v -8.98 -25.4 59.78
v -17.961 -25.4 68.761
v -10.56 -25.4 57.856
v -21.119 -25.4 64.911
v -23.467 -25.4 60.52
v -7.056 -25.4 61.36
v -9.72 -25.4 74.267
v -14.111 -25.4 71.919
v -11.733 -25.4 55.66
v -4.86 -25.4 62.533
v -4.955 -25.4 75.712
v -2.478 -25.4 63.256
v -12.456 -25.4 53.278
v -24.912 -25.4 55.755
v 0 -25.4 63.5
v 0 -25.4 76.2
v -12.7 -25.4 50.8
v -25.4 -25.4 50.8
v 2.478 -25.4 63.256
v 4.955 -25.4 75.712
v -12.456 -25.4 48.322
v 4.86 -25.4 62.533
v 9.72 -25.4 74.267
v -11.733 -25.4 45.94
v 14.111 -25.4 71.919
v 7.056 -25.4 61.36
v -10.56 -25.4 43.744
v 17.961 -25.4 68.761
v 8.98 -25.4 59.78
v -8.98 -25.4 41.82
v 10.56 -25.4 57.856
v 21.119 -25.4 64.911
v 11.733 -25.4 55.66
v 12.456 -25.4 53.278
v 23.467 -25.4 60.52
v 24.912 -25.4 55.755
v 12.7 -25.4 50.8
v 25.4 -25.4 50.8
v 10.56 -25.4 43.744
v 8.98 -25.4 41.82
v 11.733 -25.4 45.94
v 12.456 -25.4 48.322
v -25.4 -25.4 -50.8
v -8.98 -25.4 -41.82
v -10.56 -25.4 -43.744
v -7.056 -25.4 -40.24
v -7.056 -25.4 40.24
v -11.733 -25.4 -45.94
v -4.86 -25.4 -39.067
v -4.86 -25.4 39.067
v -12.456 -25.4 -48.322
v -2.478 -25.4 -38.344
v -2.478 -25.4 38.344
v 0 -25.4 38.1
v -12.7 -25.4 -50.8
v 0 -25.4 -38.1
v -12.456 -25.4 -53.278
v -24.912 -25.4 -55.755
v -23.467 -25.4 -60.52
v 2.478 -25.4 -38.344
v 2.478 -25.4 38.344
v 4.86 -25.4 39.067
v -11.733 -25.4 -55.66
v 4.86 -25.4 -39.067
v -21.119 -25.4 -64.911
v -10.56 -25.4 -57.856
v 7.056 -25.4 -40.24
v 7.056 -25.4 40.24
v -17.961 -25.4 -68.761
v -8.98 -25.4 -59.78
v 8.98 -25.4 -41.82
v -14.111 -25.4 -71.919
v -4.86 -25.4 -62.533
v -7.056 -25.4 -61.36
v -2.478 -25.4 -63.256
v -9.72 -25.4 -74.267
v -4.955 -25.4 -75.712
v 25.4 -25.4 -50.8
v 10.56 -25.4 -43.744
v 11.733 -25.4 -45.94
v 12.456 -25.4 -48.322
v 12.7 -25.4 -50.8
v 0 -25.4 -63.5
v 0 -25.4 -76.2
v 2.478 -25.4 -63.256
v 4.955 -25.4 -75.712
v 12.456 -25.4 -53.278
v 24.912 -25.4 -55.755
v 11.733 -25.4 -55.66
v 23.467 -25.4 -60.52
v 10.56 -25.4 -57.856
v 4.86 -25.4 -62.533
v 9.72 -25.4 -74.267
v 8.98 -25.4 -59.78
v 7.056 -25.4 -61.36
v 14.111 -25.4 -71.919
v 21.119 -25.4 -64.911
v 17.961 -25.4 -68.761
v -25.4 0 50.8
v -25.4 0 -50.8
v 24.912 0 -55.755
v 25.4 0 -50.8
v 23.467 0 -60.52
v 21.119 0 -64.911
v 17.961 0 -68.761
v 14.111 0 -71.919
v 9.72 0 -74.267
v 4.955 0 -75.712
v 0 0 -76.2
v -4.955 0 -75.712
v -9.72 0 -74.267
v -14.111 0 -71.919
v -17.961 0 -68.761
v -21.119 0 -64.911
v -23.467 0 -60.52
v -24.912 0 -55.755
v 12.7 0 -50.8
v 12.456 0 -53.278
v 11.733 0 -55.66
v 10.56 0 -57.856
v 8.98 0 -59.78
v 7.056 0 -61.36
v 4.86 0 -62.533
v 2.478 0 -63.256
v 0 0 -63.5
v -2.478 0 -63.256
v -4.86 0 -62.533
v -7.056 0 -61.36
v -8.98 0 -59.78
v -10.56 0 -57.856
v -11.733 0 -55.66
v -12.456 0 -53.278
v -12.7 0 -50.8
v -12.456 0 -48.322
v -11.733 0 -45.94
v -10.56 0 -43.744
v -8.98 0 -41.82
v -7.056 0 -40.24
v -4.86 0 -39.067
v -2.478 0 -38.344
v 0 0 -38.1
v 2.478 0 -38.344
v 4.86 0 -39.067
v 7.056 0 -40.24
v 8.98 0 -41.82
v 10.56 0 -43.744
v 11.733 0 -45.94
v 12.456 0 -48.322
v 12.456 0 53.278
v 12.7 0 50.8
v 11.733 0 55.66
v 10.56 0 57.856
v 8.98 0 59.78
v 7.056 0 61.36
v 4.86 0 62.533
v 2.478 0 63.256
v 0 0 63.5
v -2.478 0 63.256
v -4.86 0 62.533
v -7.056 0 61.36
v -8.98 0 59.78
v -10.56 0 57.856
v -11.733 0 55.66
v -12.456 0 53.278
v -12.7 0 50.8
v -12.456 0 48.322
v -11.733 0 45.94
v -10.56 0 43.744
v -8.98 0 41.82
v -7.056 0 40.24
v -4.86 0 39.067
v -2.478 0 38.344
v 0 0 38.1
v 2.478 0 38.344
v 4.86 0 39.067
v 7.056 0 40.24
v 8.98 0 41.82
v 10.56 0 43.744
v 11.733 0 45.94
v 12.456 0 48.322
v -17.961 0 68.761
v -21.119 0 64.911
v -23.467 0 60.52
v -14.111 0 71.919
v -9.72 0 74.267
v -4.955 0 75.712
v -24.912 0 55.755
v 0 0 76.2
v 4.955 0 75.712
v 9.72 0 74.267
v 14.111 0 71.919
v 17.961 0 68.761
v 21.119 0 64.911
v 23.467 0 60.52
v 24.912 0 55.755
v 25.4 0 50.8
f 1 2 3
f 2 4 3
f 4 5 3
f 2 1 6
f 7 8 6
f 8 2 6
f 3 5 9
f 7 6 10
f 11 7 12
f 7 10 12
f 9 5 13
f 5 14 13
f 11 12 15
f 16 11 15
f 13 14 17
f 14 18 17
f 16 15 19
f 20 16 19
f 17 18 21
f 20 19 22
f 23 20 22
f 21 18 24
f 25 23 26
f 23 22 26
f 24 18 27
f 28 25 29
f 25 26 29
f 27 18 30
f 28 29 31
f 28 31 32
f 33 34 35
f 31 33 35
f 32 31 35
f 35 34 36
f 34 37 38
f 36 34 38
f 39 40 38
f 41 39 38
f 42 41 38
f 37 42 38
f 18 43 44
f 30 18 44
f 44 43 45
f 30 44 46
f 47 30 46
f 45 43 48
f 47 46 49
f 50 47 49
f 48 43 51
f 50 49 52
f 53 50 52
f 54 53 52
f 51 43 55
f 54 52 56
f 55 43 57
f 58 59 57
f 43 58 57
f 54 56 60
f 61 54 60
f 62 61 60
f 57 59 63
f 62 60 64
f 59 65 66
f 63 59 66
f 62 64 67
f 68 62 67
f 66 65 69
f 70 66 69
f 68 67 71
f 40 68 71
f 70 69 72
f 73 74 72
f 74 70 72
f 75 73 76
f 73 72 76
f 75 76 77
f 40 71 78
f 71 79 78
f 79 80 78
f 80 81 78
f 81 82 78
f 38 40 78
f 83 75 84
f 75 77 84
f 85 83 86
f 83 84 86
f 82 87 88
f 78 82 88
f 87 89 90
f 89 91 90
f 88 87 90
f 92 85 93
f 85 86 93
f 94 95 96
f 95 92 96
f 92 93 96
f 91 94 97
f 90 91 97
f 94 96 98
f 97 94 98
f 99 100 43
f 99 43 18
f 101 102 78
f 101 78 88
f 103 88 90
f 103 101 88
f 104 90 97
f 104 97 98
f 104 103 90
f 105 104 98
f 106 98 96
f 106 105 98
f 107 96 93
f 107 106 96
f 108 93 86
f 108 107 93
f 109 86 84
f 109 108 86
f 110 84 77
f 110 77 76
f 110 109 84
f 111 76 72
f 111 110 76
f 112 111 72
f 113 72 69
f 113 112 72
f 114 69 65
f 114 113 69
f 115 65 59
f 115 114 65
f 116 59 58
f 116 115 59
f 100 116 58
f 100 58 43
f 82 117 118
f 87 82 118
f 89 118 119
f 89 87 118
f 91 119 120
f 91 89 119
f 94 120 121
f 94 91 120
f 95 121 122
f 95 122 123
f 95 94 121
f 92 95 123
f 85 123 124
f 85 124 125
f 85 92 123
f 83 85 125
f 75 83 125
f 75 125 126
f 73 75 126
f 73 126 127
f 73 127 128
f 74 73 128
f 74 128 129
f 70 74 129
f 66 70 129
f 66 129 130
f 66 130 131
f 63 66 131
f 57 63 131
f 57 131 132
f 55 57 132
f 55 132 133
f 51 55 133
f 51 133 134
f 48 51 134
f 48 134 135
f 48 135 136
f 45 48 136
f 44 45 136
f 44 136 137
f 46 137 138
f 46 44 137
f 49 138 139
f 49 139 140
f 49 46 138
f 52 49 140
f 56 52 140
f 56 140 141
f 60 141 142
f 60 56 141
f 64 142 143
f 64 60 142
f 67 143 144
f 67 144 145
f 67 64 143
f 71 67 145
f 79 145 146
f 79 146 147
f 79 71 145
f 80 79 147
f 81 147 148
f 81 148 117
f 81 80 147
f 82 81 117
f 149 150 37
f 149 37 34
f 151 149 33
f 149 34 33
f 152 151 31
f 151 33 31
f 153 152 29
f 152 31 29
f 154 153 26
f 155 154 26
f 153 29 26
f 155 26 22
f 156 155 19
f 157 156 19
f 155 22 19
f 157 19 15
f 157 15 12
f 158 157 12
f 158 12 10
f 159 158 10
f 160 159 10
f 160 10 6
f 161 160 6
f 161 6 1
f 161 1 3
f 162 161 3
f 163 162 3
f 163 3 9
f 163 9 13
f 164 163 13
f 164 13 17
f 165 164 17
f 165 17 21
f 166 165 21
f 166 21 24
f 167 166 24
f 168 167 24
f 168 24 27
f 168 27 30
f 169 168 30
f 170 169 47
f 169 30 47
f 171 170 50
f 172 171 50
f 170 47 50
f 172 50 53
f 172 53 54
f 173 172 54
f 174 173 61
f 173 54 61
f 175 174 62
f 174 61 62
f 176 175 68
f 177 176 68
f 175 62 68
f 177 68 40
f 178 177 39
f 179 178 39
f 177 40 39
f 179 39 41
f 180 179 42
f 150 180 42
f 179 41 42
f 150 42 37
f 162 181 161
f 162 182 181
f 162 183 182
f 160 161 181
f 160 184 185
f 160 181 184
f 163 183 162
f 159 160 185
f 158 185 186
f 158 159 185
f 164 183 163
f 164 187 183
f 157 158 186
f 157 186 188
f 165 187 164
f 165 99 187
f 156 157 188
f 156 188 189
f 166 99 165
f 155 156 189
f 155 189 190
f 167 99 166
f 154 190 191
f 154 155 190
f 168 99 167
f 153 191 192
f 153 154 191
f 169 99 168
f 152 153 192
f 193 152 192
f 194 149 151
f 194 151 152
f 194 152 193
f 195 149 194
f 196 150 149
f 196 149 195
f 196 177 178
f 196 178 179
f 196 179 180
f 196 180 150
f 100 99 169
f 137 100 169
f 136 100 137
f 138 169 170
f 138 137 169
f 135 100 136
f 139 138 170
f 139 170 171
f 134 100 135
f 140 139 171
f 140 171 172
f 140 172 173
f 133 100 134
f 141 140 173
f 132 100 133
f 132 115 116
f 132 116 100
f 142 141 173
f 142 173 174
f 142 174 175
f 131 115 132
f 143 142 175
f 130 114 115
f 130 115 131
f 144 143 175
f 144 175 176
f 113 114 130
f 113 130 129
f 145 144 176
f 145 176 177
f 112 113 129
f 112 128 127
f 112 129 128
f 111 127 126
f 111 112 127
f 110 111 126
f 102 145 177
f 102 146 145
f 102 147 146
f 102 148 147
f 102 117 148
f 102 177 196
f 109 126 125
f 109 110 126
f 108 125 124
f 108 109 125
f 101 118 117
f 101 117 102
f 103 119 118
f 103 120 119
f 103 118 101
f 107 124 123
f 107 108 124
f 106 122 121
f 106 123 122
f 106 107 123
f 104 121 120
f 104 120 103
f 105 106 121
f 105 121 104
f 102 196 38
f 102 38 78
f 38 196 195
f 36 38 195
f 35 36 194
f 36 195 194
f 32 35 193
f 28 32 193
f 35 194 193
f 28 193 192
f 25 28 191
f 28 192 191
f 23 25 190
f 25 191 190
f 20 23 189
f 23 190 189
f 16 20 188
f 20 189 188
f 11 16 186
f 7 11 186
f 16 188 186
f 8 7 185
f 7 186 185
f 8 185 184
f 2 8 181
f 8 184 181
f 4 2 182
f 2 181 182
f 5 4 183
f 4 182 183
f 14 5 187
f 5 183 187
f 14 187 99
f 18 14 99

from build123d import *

# Parameters (mm, degrees)
F1_DEPTH = 25.4
F2_R     = 12.7
F3_DEPTH = 50.8


with BuildPart() as f1:
    # F0 (on Front) → F1 (new body)
    with BuildSketch(Plane.XZ):
        with BuildLine():
            ThreePointArc((-25.4, 50.8), (0, 25.4), (25.4, 50.8))
            Line((25.4, 50.8), (-25.4, 50.8))
        make_face()
        with BuildLine():
            Line((-25.4, 50.8), (25.4, 50.8))
            ThreePointArc((25.4, 50.8), (0, 76.2), (-25.4, 50.8))
        make_face()
        with BuildLine():
            Line((-25.4, 0), (25.4, 0))
            Line((25.4, 0), (25.4, 50.8))
            ThreePointArc((25.4, 50.8), (0, 25.4), (-25.4, 50.8))
            Line((-25.4, 50.8), (-25.4, 0))
        make_face()
    extrude(amount=F1_DEPTH)

    # F2 (on face) → F3 (cut)
    with BuildSketch(Plane.XZ.offset(25.4)):
        with Locations((0, 50.8)):
            Circle(F2_R)
    extrude(amount=-F3_DEPTH, mode=Mode.SUBTRACT)

    # F4: F1 across face


with BuildPart() as f1_1:
    add(f1.part)
    add(f1.part.mirror(Plane(origin=(0, -12.7, 0), x_dir=(1, 0, 0), z_dir=(0, 0, -1))))


solid = f1_1.part
